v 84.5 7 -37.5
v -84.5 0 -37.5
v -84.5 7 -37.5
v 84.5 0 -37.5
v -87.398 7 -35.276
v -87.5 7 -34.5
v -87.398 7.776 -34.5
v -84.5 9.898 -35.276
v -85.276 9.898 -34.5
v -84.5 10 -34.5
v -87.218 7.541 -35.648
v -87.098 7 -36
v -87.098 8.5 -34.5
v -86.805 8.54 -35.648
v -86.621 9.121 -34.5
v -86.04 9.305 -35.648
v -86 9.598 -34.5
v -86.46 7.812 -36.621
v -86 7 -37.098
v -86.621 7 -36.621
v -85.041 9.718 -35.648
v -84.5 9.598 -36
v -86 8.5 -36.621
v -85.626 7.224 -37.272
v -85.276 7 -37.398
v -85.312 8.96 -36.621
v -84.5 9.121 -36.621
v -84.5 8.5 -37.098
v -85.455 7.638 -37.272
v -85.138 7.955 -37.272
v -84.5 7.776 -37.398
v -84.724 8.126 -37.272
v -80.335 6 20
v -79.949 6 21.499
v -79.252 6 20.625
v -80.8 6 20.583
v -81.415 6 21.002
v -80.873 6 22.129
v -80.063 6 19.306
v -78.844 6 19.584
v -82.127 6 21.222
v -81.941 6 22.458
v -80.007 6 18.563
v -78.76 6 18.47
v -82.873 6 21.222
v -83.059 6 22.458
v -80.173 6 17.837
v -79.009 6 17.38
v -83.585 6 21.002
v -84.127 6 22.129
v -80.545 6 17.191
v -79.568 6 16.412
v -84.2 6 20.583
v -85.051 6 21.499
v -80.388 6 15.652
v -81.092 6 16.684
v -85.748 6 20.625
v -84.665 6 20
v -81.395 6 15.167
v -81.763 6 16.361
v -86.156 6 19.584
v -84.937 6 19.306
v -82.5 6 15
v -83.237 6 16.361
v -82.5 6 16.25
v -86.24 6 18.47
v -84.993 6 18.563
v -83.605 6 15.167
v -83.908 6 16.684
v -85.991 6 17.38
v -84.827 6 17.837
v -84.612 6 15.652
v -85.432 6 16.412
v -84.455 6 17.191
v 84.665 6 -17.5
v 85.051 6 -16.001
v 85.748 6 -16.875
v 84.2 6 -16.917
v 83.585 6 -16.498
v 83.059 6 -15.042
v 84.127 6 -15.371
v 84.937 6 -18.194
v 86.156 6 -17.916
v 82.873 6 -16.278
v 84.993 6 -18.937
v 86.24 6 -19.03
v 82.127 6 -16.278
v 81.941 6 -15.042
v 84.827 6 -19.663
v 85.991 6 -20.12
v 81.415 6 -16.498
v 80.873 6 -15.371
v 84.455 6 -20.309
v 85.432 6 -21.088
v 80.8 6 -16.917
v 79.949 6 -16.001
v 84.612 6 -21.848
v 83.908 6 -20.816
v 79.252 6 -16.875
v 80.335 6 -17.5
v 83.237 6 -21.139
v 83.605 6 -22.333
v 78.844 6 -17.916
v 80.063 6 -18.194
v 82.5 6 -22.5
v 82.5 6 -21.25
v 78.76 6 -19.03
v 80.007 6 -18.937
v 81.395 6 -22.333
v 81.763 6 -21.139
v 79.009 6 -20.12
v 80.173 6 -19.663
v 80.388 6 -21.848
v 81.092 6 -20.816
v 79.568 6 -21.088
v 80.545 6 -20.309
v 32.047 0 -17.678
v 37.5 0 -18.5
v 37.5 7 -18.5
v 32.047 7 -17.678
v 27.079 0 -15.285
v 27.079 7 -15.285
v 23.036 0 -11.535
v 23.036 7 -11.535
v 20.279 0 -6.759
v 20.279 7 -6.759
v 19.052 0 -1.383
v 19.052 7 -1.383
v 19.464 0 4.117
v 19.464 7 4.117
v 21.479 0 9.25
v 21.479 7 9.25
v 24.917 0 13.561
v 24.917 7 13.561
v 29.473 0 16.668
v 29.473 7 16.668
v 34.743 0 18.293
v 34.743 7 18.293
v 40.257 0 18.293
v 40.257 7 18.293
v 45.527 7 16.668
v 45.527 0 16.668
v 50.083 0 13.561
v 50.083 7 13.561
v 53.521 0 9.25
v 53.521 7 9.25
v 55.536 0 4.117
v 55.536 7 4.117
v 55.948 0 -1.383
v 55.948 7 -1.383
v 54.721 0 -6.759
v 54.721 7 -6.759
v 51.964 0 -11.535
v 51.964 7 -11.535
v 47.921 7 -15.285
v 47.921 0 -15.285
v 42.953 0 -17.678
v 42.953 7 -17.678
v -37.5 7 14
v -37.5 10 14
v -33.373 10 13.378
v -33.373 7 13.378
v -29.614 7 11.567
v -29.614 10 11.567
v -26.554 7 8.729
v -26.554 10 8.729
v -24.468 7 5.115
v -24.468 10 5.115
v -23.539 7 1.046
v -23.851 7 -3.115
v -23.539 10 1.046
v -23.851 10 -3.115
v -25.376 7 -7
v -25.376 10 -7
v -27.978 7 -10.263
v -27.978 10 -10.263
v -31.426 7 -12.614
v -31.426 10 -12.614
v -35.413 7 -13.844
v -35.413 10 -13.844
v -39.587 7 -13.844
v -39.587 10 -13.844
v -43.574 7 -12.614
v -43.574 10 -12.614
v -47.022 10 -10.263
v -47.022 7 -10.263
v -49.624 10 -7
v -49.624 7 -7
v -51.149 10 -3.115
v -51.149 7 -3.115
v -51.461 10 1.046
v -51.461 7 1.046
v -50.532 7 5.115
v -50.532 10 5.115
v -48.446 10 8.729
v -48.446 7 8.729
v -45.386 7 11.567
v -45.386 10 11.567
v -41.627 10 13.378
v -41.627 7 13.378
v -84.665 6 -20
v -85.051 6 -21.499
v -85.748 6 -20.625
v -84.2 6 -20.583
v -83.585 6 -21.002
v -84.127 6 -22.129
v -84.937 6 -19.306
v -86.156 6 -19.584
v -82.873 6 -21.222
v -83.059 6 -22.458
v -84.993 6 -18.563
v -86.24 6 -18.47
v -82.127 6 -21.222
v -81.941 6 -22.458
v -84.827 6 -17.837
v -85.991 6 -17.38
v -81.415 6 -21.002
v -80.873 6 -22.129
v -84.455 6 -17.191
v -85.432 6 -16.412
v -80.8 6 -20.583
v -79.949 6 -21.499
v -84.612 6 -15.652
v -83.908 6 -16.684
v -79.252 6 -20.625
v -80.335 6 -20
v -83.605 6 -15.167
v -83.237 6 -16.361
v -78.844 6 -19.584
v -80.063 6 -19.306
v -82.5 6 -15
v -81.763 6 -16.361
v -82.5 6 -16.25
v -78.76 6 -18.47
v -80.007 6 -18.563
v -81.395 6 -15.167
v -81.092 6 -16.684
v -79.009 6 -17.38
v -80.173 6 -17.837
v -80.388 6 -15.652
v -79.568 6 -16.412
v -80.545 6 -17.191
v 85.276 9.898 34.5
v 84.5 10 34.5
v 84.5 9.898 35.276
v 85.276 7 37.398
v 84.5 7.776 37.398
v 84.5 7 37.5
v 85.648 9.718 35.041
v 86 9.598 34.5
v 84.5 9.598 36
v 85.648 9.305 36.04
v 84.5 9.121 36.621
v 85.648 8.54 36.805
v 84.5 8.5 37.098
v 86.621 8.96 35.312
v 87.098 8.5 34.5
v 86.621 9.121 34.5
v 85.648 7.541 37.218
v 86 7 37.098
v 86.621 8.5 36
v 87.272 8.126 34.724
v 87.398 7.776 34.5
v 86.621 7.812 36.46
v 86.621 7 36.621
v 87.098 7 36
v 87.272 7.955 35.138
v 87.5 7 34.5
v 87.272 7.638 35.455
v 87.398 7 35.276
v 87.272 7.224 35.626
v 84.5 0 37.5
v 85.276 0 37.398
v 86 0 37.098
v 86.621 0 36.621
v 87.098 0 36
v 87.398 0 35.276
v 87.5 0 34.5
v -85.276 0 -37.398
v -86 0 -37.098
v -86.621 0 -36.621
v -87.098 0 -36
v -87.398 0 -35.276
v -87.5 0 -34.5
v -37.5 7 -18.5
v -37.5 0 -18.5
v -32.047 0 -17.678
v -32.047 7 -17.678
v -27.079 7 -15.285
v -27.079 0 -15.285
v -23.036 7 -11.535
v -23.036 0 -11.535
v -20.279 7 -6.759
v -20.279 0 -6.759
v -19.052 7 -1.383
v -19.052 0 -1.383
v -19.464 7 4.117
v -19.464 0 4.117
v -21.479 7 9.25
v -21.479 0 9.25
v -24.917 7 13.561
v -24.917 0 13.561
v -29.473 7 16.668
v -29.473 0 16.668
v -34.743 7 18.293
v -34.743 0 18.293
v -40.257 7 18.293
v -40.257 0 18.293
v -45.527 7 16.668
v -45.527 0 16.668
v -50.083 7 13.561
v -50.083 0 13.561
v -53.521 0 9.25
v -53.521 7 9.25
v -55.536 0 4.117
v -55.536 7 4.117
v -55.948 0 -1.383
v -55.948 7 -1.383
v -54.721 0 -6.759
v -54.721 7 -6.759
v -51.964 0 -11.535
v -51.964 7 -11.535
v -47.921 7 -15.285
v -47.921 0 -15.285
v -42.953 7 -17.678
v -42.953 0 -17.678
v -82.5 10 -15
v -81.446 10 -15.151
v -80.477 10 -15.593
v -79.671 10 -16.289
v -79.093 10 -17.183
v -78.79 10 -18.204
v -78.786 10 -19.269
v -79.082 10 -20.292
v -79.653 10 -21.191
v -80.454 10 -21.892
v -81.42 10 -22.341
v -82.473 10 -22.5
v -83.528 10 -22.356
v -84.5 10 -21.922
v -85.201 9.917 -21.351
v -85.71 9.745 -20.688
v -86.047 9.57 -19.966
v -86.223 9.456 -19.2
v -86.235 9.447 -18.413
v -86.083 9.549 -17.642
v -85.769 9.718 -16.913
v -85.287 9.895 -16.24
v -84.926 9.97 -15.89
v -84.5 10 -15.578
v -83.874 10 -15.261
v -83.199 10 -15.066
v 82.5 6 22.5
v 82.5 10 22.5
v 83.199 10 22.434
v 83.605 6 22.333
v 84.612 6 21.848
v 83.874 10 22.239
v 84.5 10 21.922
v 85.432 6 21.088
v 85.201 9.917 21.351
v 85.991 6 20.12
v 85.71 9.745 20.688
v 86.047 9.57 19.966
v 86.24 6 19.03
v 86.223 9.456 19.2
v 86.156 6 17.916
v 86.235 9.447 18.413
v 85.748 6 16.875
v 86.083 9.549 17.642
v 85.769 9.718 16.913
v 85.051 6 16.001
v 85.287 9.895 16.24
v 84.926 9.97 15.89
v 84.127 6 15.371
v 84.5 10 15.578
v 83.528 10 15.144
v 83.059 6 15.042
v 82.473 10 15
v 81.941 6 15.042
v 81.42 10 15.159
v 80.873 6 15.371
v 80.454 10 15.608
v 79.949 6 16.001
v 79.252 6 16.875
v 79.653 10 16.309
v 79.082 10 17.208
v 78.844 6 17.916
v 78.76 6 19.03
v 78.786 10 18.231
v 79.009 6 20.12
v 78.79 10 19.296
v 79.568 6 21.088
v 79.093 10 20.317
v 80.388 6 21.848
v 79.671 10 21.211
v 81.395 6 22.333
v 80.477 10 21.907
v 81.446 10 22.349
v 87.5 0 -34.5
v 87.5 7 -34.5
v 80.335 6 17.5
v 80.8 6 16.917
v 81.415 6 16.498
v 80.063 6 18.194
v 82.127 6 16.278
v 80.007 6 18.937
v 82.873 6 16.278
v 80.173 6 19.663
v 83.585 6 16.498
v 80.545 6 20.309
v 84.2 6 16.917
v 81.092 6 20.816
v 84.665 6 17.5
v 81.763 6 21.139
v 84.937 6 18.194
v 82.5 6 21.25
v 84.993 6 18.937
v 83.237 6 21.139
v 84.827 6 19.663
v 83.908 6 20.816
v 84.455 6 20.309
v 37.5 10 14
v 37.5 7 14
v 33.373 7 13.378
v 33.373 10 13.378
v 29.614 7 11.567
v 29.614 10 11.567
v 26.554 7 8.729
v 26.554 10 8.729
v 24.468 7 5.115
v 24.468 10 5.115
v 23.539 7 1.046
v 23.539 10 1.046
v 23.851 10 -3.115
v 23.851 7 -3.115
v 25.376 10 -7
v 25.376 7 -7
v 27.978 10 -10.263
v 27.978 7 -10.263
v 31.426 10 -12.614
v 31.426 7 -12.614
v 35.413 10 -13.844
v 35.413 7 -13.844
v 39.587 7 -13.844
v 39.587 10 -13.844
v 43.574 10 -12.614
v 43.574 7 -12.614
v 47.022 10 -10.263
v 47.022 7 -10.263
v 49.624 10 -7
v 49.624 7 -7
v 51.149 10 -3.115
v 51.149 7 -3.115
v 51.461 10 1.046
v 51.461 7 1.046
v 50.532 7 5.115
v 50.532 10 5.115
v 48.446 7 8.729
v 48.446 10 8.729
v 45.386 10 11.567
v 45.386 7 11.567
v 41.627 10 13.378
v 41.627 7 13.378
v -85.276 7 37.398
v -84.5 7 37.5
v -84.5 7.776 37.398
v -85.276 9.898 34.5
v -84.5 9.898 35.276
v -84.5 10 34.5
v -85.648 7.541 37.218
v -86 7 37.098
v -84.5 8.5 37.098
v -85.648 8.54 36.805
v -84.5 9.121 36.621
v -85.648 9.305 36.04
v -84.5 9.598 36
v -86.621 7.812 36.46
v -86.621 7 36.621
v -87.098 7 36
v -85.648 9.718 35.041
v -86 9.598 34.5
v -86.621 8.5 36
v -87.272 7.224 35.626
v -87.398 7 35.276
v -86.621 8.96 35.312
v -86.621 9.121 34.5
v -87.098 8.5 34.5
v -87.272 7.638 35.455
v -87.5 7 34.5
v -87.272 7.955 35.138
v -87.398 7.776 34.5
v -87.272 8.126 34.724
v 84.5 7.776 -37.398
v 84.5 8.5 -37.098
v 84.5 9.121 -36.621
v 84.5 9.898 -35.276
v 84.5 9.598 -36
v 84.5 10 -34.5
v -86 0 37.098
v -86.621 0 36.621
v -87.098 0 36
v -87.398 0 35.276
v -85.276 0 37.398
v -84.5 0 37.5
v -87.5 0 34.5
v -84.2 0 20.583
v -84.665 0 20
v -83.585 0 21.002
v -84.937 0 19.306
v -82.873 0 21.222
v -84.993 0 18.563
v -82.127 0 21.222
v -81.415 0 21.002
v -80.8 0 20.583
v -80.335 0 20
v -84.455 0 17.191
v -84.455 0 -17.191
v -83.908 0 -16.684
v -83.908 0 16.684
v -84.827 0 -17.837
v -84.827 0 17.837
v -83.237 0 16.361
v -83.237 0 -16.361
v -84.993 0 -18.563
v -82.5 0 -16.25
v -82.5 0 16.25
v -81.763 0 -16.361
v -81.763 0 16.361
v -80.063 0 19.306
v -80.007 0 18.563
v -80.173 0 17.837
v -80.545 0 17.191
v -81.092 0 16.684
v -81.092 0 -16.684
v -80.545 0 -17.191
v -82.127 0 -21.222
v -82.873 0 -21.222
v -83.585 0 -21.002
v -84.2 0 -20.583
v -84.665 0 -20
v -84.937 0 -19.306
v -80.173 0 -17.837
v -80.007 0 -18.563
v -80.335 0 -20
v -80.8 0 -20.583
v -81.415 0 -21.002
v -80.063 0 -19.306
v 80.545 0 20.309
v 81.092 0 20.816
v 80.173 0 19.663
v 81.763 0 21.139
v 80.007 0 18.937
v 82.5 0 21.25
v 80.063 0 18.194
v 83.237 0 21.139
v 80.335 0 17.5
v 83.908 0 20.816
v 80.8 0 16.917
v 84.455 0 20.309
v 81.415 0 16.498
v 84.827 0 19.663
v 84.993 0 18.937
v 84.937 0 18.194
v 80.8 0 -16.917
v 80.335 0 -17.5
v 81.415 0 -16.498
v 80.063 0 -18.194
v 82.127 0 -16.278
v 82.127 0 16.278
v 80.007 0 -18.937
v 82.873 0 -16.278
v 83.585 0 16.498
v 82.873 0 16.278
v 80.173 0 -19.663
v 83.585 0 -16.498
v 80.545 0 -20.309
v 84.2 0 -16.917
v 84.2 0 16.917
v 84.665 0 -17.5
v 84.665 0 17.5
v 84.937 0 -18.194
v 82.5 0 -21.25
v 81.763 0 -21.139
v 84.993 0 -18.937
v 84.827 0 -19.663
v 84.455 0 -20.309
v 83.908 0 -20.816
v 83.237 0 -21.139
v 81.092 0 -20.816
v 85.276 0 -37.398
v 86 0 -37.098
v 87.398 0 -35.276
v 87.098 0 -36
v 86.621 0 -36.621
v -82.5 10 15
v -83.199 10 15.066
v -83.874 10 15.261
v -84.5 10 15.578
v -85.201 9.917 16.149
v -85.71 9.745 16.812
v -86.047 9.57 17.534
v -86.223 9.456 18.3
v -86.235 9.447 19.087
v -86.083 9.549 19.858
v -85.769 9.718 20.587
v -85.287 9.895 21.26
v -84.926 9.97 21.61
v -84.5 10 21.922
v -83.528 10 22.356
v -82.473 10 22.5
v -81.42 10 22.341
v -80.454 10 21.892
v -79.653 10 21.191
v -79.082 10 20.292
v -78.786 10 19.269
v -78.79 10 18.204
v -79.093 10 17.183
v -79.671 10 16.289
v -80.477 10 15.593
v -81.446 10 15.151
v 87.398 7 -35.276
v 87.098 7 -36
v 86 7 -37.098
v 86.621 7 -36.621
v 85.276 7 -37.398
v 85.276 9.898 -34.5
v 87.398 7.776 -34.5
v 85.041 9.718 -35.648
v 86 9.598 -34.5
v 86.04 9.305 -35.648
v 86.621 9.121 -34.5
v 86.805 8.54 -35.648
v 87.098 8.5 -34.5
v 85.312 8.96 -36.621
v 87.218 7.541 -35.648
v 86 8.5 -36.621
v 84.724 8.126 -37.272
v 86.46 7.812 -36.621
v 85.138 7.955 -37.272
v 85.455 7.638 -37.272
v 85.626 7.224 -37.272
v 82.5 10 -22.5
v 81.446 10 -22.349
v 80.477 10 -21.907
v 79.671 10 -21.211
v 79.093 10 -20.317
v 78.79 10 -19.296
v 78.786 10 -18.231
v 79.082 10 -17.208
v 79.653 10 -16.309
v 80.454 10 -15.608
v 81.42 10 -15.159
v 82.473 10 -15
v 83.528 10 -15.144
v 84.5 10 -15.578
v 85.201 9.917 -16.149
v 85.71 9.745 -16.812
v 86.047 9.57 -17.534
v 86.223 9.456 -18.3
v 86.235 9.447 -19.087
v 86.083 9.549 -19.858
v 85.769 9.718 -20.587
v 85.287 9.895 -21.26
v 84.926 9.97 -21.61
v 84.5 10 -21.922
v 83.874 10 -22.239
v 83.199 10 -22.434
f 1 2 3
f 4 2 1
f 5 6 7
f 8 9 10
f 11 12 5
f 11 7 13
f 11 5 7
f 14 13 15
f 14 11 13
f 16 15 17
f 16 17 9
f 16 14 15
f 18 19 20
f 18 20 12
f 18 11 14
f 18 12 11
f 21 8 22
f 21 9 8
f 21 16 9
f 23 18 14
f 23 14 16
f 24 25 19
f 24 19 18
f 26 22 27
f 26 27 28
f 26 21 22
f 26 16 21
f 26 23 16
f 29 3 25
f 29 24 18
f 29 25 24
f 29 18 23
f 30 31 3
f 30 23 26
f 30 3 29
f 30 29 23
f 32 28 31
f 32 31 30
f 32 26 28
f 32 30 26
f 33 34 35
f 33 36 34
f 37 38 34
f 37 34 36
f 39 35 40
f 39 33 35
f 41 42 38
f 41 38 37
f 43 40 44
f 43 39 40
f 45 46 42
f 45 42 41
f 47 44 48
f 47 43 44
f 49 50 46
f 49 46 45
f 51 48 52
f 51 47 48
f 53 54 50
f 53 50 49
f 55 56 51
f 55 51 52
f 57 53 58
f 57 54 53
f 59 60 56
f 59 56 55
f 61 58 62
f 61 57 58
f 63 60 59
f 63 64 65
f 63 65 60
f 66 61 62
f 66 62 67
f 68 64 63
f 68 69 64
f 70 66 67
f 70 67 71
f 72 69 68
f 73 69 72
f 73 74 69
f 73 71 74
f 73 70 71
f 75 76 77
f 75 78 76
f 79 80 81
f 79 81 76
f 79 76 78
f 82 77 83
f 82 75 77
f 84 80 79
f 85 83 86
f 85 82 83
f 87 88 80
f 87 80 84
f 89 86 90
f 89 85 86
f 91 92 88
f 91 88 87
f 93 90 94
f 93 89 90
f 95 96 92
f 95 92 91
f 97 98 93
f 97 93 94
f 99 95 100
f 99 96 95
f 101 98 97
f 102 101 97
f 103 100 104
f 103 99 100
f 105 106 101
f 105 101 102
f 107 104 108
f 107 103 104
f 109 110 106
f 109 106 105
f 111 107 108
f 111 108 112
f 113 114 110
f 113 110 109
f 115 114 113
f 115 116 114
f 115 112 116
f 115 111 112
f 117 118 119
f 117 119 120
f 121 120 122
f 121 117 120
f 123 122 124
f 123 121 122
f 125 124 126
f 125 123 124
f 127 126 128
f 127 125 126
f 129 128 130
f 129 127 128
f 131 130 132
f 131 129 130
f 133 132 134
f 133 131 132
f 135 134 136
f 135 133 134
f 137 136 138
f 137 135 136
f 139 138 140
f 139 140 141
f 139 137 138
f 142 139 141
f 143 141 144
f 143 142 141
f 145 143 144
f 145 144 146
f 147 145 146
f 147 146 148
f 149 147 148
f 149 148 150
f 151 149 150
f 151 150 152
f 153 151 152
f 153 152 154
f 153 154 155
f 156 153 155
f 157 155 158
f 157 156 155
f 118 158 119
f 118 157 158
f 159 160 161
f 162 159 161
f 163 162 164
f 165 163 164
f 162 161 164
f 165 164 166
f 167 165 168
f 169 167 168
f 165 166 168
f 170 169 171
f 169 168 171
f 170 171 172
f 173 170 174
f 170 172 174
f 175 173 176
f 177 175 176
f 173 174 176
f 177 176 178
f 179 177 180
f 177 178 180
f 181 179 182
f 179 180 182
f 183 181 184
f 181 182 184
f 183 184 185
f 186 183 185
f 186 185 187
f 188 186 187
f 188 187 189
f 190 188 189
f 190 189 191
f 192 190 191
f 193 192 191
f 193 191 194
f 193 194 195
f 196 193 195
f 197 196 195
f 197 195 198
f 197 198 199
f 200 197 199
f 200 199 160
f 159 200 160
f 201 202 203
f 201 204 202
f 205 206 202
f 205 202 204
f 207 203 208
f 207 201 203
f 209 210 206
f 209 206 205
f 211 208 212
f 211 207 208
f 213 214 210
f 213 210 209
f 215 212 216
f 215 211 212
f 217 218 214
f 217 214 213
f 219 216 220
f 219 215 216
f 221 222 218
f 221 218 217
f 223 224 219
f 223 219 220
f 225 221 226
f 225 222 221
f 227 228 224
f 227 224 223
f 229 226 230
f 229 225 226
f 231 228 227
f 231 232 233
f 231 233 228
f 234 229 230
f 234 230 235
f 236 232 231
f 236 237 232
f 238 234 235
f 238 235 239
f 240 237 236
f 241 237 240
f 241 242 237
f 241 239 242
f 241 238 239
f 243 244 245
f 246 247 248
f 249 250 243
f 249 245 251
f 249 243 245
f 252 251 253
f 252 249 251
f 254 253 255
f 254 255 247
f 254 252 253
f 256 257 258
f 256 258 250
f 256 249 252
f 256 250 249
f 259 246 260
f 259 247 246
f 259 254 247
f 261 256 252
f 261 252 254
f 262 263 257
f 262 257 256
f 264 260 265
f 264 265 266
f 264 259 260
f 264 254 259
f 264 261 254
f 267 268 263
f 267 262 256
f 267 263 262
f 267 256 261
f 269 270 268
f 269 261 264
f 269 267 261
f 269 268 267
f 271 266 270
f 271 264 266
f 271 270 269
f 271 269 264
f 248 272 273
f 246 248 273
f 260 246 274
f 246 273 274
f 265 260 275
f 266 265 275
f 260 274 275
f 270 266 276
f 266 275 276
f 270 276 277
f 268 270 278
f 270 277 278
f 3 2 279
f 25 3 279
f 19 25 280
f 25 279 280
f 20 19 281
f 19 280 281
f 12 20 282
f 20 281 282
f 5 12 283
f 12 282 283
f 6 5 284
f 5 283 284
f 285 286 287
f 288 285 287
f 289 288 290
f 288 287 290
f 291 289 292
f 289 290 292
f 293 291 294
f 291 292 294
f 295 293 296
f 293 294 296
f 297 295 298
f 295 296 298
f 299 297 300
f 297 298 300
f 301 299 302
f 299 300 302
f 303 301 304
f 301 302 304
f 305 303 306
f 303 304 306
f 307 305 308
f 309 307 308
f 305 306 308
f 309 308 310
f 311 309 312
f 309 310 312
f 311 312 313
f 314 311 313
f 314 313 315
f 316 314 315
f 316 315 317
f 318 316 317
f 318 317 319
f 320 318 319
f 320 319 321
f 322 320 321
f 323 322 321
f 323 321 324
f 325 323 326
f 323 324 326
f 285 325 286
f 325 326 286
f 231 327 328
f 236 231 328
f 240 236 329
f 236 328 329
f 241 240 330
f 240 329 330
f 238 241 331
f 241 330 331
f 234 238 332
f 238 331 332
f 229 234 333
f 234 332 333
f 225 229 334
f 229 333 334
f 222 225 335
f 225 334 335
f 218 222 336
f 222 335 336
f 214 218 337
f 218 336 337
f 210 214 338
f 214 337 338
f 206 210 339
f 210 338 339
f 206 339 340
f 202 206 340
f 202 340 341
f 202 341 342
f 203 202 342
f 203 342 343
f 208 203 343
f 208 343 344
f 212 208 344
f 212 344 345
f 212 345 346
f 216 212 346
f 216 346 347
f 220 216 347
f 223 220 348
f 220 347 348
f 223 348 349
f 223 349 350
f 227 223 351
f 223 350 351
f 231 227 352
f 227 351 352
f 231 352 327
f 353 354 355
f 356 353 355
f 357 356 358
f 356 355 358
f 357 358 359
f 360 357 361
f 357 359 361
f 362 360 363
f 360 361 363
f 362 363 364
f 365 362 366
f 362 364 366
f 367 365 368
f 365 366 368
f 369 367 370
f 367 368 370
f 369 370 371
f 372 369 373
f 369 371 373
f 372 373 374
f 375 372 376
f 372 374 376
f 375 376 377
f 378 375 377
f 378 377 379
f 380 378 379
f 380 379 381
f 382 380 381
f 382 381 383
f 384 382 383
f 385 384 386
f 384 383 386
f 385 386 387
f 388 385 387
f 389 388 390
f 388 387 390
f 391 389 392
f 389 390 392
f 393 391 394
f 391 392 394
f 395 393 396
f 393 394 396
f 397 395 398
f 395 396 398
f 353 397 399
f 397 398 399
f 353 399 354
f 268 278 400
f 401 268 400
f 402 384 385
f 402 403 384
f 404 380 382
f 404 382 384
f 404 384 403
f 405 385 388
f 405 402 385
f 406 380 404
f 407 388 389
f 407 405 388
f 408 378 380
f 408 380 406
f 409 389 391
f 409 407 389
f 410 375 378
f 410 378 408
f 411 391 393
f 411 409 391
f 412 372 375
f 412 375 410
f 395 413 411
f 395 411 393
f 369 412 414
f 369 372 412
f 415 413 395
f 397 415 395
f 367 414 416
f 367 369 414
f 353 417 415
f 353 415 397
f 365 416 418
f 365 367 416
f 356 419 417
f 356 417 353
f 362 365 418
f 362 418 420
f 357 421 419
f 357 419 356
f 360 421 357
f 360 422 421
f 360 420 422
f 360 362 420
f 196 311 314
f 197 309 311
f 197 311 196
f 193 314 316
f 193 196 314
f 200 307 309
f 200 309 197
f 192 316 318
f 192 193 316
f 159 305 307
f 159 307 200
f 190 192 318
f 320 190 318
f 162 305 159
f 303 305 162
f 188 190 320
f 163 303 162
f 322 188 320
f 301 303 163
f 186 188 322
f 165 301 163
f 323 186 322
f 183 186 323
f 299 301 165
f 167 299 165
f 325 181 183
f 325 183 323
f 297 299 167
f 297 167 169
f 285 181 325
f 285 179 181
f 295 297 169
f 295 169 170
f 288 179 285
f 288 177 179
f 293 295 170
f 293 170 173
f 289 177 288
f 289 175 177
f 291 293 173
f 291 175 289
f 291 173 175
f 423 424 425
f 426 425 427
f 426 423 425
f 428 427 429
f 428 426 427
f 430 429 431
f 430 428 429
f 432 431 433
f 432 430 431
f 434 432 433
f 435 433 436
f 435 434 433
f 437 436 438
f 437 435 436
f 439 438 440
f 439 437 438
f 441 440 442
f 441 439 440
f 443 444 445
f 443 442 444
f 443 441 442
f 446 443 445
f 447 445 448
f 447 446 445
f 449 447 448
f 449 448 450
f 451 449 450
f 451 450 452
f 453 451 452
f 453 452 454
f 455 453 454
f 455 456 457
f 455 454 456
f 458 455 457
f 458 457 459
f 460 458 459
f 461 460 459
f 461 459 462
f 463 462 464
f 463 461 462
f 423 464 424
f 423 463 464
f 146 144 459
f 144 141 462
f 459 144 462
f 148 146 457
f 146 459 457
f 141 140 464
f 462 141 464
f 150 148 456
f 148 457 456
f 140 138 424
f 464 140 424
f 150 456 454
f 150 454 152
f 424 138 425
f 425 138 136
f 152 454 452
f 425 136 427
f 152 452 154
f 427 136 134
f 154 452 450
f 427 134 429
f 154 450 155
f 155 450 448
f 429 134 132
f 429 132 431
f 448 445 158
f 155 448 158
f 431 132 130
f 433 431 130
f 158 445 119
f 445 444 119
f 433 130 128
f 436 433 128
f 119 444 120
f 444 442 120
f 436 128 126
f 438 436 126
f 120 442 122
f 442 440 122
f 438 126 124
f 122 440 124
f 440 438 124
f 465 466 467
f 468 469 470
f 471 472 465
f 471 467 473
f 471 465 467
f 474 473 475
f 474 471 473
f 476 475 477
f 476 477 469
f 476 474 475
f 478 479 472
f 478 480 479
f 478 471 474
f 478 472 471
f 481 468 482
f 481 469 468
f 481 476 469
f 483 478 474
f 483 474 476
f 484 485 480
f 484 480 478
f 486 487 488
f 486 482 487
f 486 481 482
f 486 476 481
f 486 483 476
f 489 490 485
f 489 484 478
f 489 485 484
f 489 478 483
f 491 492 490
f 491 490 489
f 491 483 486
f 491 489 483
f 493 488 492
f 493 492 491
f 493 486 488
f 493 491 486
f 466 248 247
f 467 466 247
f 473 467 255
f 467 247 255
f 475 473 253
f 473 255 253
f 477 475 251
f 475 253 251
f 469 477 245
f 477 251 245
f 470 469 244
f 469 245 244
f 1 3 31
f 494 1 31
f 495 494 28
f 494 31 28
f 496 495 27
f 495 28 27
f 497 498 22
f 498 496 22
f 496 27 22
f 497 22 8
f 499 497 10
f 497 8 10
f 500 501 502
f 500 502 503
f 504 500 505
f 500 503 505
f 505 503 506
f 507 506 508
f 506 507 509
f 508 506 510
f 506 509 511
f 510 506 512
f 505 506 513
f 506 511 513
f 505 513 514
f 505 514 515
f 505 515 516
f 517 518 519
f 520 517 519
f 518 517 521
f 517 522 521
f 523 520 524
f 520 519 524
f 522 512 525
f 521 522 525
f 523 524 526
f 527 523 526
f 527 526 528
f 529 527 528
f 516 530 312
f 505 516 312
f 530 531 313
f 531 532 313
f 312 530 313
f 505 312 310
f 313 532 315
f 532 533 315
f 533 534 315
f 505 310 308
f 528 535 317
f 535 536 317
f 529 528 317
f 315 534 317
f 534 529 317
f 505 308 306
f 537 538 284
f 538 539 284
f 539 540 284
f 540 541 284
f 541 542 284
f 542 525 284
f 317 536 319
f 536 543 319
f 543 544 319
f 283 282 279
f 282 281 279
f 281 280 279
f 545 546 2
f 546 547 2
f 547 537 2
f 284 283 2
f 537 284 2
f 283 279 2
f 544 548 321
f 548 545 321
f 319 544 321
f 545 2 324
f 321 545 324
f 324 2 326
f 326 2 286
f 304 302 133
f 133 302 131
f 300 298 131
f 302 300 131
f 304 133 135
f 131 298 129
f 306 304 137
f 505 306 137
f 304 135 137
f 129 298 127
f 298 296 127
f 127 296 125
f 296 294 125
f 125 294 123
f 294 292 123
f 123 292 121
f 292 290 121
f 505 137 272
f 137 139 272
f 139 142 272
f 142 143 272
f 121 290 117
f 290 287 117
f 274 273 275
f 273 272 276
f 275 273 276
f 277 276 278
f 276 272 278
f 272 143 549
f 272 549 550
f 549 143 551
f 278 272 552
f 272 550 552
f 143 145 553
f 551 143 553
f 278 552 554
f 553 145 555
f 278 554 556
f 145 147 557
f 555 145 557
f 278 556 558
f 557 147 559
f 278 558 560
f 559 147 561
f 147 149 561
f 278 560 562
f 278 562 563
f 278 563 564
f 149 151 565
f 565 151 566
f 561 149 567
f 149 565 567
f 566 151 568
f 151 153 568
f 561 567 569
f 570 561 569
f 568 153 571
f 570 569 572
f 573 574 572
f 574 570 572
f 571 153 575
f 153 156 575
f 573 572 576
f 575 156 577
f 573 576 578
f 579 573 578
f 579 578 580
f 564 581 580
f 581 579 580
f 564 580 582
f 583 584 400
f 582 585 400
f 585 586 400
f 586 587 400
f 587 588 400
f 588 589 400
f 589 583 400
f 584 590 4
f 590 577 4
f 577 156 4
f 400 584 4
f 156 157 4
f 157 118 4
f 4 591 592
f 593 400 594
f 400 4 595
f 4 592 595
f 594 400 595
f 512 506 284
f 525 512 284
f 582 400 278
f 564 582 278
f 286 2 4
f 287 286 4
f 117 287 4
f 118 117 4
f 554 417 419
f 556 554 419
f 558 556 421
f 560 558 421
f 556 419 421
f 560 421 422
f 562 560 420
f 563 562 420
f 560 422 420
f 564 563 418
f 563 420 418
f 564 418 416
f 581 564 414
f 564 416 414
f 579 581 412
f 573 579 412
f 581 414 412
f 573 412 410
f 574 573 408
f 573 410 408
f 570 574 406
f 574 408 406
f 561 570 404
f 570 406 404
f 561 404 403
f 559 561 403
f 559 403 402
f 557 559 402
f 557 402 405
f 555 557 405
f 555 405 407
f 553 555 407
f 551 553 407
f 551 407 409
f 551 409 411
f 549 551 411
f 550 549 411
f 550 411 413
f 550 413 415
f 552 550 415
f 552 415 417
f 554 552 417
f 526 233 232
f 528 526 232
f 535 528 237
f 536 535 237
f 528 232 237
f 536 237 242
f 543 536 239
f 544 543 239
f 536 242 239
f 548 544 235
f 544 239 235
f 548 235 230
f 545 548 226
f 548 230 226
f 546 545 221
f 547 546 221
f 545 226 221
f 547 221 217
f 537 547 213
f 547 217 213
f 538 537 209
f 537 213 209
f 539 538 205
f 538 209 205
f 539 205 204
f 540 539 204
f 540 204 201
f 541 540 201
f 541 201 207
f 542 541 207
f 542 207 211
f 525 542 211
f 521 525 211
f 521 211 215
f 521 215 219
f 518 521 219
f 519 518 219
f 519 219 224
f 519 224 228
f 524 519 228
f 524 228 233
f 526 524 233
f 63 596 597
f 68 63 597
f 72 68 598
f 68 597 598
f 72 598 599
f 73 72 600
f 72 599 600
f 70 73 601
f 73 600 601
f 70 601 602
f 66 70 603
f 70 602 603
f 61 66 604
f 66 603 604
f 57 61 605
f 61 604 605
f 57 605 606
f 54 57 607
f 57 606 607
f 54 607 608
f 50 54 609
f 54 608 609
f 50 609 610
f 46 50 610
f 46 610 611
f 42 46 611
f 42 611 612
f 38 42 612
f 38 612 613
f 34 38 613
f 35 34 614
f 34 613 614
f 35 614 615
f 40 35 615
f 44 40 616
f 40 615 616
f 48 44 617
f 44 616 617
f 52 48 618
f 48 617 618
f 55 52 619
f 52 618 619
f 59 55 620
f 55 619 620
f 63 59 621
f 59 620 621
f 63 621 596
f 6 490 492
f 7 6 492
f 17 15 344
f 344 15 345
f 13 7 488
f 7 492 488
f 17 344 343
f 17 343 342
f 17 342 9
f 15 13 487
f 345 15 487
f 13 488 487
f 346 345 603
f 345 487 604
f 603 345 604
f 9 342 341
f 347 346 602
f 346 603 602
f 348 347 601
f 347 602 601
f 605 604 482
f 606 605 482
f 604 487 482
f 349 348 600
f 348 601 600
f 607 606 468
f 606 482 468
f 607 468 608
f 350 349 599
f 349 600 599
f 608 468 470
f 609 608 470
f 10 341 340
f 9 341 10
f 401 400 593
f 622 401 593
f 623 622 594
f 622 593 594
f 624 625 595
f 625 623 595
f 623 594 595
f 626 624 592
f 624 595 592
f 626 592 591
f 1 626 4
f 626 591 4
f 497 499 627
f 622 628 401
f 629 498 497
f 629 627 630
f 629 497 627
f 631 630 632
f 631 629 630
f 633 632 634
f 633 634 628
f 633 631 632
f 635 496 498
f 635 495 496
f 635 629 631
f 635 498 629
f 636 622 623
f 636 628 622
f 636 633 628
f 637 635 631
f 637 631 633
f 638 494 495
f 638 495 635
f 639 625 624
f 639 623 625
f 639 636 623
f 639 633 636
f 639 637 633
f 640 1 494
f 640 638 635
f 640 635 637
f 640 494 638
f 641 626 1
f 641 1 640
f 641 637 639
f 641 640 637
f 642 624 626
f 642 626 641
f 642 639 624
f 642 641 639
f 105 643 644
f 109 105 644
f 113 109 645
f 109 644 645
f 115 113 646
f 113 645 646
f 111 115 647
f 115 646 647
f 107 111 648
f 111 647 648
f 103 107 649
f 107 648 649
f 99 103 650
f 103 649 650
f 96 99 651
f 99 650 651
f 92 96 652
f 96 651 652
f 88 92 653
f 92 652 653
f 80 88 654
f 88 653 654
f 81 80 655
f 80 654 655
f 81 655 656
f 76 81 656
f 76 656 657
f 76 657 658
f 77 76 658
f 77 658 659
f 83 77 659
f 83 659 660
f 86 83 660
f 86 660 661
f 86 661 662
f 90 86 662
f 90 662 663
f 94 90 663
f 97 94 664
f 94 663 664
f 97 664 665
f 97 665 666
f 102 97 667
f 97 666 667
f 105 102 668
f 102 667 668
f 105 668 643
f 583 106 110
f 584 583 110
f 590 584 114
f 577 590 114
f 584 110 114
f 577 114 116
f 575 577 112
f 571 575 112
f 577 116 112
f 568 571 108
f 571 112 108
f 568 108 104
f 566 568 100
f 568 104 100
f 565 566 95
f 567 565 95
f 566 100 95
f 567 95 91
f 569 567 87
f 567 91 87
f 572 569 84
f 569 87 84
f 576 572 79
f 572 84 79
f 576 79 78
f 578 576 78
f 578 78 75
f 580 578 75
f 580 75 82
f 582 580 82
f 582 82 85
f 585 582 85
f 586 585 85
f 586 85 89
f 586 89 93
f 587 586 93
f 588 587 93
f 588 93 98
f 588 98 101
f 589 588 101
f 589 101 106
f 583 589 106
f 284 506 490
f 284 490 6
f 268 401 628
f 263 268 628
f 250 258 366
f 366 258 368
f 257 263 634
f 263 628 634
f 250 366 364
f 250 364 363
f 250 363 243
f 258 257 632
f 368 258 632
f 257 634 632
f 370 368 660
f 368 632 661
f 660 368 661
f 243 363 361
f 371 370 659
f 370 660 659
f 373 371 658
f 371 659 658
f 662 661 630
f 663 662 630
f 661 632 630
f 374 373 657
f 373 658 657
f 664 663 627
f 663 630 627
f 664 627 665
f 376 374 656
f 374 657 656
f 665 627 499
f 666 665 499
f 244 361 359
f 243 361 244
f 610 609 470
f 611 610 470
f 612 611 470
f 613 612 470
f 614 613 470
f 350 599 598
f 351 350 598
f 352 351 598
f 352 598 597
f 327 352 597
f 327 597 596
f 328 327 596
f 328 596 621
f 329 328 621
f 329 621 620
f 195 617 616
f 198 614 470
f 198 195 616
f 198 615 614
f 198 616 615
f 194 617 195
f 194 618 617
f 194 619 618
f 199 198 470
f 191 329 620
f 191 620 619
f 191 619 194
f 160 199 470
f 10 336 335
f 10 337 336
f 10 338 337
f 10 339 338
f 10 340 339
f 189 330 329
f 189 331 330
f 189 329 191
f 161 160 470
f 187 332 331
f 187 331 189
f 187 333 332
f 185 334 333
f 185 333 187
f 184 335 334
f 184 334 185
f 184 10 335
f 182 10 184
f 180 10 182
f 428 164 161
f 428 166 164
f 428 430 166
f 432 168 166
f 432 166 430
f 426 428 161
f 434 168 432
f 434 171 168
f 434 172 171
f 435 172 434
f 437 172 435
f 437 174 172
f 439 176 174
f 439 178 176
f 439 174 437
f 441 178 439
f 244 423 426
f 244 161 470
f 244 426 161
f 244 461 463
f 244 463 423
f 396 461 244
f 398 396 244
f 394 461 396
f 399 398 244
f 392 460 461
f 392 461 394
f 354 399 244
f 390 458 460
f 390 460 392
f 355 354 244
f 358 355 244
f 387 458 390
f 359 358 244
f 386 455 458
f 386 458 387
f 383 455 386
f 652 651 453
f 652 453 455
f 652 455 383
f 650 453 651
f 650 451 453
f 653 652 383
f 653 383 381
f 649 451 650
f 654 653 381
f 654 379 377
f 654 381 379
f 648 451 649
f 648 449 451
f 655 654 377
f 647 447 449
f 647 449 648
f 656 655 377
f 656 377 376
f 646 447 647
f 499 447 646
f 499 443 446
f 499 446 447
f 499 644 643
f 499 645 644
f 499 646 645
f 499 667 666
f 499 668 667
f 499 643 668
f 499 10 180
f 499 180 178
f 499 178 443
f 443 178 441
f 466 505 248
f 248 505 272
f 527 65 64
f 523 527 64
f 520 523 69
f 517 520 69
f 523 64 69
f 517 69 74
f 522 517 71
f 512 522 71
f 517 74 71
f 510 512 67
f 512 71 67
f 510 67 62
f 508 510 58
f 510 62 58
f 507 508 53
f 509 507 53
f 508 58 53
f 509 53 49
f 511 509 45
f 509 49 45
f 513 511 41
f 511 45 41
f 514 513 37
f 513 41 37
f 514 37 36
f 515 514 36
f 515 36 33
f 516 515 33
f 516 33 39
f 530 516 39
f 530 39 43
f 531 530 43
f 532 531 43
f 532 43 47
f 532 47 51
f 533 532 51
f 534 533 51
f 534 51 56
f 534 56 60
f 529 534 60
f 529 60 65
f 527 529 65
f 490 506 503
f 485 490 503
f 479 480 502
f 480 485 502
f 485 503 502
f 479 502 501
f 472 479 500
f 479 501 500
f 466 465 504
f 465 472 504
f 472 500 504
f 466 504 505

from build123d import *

# Parameters (mm, degrees)
SKETCH1_W           = 175
SKETCH1_H           = 75
BOSS_EXTRUDE1_DEPTH = 10
SKETCH2_R           = 3.75
CUT_EXTRUDE1_DEPTH  = 4
SKETCH3_R           = 2.5
CUT_EXTRUDE2_DEPTH  = 96.720948595
SKETCH4_R           = 14
CUT_EXTRUDE3_DEPTH  = 96.720948595
SKETCH5_R           = 18.5
CUT_EXTRUDE4_DEPTH  = 7
FILLET1_R           = 3


with BuildPart() as part:
    # Sketch1 → Boss-Extrude1 (new body)
    with BuildSketch(Plane(origin=(0, 0, 0), x_dir=(1, 0, 0), z_dir=(0, 1, 0))):
        Rectangle(SKETCH1_W, SKETCH1_H)
    extrude(amount=BOSS_EXTRUDE1_DEPTH)

    # Sketch2 → Cut-Extrude1 (cut)
    with BuildSketch(Plane(origin=(0, 10, 0), x_dir=(1, 0, 0), z_dir=(0, 1, 0))):
        with Locations(Location((-82.5, 18.75, 0), (0, 0, 270))):
            Circle(SKETCH2_R)
        with Locations(Location((-82.5, -18.75, 0), (0, 0, 90))):
            Circle(SKETCH2_R)
        with Locations(Location((82.5, -18.75, 0), (0, 0, 270))):
            Circle(SKETCH2_R)
        with Locations(Location((82.5, 18.75, 0), (0, 0, 90))):
            Circle(SKETCH2_R)
    extrude(amount=-CUT_EXTRUDE1_DEPTH, mode=Mode.SUBTRACT)

    # Sketch3 → Cut-Extrude2 (cut, through all)
    with BuildSketch(Plane(origin=(0, 10, 0), x_dir=(1, 0, 0), z_dir=(0, 1, 0))):
        with Locations(Location((-82.5, 18.75, 0), (0, 0, 270))):
            Circle(SKETCH3_R)
        with Locations(Location((-82.5, -18.75, 0), (0, 0, 90))):
            Circle(SKETCH3_R)
        with Locations(Location((82.5, -18.75, 0), (0, 0, 270))):
            Circle(SKETCH3_R)
        with Locations(Location((82.5, 18.75, 0), (0, 0, 90))):
            Circle(SKETCH3_R)
    extrude(amount=-CUT_EXTRUDE2_DEPTH, mode=Mode.SUBTRACT)

    # Sketch4 → Cut-Extrude3 (cut, through all)
    with BuildSketch(Plane(origin=(0, 10, 0), x_dir=(1, 0, 0), z_dir=(0, 1, 0))):
        with Locations(Location((-37.5, 0, 0), (0, 0, 270))):
            Circle(SKETCH4_R)
    cut_extrude3 = extrude(amount=-CUT_EXTRUDE3_DEPTH, mode=Mode.SUBTRACT)

    # Sketch5 → Cut-Extrude4 (cut)
    with BuildSketch(Plane.XZ):
        with Locations(Location((-37.5, 0, 0), (0, 0, 270))):
            Circle(SKETCH5_R)
    cut_extrude4 = extrude(amount=-CUT_EXTRUDE4_DEPTH, mode=Mode.SUBTRACT)

    # Mirror1: Cut-Extrude3, Cut-Extrude4 across plane
    add(cut_extrude3.mirror(Plane(origin=(0, 0, 0), x_dir=(0, 0, 1), z_dir=(1, 0, 0))), mode=Mode.SUBTRACT)
    add(cut_extrude4.mirror(Plane(origin=(0, 0, 0), x_dir=(0, 0, 1), z_dir=(1, 0, 0))), mode=Mode.SUBTRACT)

    # Fillet1
    # the kernel refuses this fillet: 3 mm, written as the material it takes off along each edge
    with BuildSketch(Plane(origin=(-84.5, 7, 34.5), x_dir=(0, 1, 0), z_dir=(-1, 0, 0))) as fillet1_piece_1_section:
        Polygon((0, 0), (FILLET1_R, 0), (FILLET1_R, -FILLET1_R), (0, -FILLET1_R), align=None)
    fillet1_piece_1 = extrude(amount=FILLET1_R, mode=Mode.PRIVATE)
    fillet1_piece_1 = fillet1_piece_1 - Plane(origin=(-84.5, 7, 34.5), x_dir=(0, -0.7071067811865475, -0.7071067811865475), z_dir=(-1, 0, 0)) * Sphere(FILLET1_R, mode=Mode.PRIVATE)
    add(fillet1_piece_1, mode=Mode.SUBTRACT)
    with BuildSketch(Plane(origin=(-84.5, 7, -34.5), x_dir=(-1, 0, 0), z_dir=(0, 0, -1))) as fillet1_piece_2_section:
        Polygon((0, 0), (FILLET1_R, 0), (FILLET1_R, FILLET1_R), (0, FILLET1_R), align=None)
    fillet1_piece_2 = extrude(amount=FILLET1_R, mode=Mode.PRIVATE)
    fillet1_piece_2 = fillet1_piece_2 - Plane(origin=(-84.5, 7, -34.5), x_dir=(0.7071067811865475, -0.7071067811865475, 0), z_dir=(0, 0, -1)) * Sphere(FILLET1_R, mode=Mode.PRIVATE)
    add(fillet1_piece_2, mode=Mode.SUBTRACT)
    with BuildSketch(Plane(origin=(84.5, 7, 34.5), x_dir=(0, 1, 0), z_dir=(1, 0, 0))) as fillet1_piece_3_section:
        Polygon((0, 0), (FILLET1_R, 0), (FILLET1_R, FILLET1_R), (0, FILLET1_R), align=None)
    fillet1_piece_3 = extrude(amount=FILLET1_R, mode=Mode.PRIVATE)
    fillet1_piece_3 = fillet1_piece_3 - Plane(origin=(84.5, 7, 34.5), x_dir=(0, -0.7071067811865475, -0.7071067811865475), z_dir=(1, 0, 0)) * Sphere(FILLET1_R, mode=Mode.PRIVATE)
    add(fillet1_piece_3, mode=Mode.SUBTRACT)
    with BuildSketch(Plane(origin=(84.5, 7, -34.5), x_dir=(1, 0, 0), z_dir=(0, 0, -1))) as fillet1_piece_4_section:
        Polygon((0, 0), (FILLET1_R, 0), (FILLET1_R, -FILLET1_R), (0, -FILLET1_R), align=None)
    fillet1_piece_4 = extrude(amount=FILLET1_R, mode=Mode.PRIVATE)
    fillet1_piece_4 = fillet1_piece_4 - Plane(origin=(84.5, 7, -34.5), x_dir=(-0.7071067811865475, -0.7071067811865475, 0), z_dir=(0, 0, -1)) * Sphere(FILLET1_R, mode=Mode.PRIVATE)
    add(fillet1_piece_4, mode=Mode.SUBTRACT)
    with BuildSketch(Plane(origin=(-87.5, 10, 34.5), x_dir=(0, -1, 0), z_dir=(0, 0, -1)), Plane(origin=(87.5, 10, -34.5), x_dir=(0, -1, 0), z_dir=(0, 0, 1))) as fillet1_piece_5:
        with BuildLine():
            CenterArc((FILLET1_R, -FILLET1_R), FILLET1_R, 90, 90)
            Line((0, -FILLET1_R), (0, 0))
            Line((0, 0), (FILLET1_R, 0))
        make_face()
    extrude(amount=69, mode=Mode.SUBTRACT)
    with BuildSketch(Plane(origin=(84.5, 10, 37.5), x_dir=(0, 0, -1), z_dir=(-1, 0, 0))) as fillet1_piece_6:
        with BuildLine():
            CenterArc((FILLET1_R, FILLET1_R), FILLET1_R, 180, 90)
            Line((0, FILLET1_R), (0, 0))
            Line((0, 0), (FILLET1_R, 0))
        make_face()
    extrude(amount=169, mode=Mode.SUBTRACT)
    with BuildSketch(Plane(origin=(87.5, -7.5, 37.5), x_dir=(0, 0, -1), z_dir=(0, 1, 0)), Plane(origin=(87.5, -7.5, -37.5), x_dir=(-1, 0, 0), z_dir=(0, 1, 0))) as fillet1_piece_7:
        with BuildLine():
            CenterArc((FILLET1_R, FILLET1_R), FILLET1_R, 180, 90)
            Line((0, FILLET1_R), (0, 0))
            Line((0, 0), (FILLET1_R, 0))
        make_face()
    extrude(amount=14.5, mode=Mode.SUBTRACT)
    with BuildSketch(Plane(origin=(-87.5, -7.5, 37.5), x_dir=(0, 0, -1), z_dir=(0, 1, 0)), Plane(origin=(-87.5, -7.5, -37.5), x_dir=(1, 0, 0), z_dir=(0, 1, 0))) as fillet1_piece_8:
        with BuildLine():
            CenterArc((FILLET1_R, -FILLET1_R), FILLET1_R, 90, 90)
            Line((0, -FILLET1_R), (0, 0))
            Line((0, 0), (FILLET1_R, 0))
        make_face()
    extrude(amount=14.5, mode=Mode.SUBTRACT)
    with BuildSketch(Plane(origin=(-84.5, 10, -37.5), x_dir=(0, -1, 0), z_dir=(1, 0, 0))) as fillet1_piece_9:
        with BuildLine():
            CenterArc((FILLET1_R, -FILLET1_R), FILLET1_R, 90, 90)
            Line((0, -FILLET1_R), (0, 0))
            Line((0, 0), (FILLET1_R, 0))
        make_face()
    extrude(amount=169, mode=Mode.SUBTRACT)


solid = part.part
